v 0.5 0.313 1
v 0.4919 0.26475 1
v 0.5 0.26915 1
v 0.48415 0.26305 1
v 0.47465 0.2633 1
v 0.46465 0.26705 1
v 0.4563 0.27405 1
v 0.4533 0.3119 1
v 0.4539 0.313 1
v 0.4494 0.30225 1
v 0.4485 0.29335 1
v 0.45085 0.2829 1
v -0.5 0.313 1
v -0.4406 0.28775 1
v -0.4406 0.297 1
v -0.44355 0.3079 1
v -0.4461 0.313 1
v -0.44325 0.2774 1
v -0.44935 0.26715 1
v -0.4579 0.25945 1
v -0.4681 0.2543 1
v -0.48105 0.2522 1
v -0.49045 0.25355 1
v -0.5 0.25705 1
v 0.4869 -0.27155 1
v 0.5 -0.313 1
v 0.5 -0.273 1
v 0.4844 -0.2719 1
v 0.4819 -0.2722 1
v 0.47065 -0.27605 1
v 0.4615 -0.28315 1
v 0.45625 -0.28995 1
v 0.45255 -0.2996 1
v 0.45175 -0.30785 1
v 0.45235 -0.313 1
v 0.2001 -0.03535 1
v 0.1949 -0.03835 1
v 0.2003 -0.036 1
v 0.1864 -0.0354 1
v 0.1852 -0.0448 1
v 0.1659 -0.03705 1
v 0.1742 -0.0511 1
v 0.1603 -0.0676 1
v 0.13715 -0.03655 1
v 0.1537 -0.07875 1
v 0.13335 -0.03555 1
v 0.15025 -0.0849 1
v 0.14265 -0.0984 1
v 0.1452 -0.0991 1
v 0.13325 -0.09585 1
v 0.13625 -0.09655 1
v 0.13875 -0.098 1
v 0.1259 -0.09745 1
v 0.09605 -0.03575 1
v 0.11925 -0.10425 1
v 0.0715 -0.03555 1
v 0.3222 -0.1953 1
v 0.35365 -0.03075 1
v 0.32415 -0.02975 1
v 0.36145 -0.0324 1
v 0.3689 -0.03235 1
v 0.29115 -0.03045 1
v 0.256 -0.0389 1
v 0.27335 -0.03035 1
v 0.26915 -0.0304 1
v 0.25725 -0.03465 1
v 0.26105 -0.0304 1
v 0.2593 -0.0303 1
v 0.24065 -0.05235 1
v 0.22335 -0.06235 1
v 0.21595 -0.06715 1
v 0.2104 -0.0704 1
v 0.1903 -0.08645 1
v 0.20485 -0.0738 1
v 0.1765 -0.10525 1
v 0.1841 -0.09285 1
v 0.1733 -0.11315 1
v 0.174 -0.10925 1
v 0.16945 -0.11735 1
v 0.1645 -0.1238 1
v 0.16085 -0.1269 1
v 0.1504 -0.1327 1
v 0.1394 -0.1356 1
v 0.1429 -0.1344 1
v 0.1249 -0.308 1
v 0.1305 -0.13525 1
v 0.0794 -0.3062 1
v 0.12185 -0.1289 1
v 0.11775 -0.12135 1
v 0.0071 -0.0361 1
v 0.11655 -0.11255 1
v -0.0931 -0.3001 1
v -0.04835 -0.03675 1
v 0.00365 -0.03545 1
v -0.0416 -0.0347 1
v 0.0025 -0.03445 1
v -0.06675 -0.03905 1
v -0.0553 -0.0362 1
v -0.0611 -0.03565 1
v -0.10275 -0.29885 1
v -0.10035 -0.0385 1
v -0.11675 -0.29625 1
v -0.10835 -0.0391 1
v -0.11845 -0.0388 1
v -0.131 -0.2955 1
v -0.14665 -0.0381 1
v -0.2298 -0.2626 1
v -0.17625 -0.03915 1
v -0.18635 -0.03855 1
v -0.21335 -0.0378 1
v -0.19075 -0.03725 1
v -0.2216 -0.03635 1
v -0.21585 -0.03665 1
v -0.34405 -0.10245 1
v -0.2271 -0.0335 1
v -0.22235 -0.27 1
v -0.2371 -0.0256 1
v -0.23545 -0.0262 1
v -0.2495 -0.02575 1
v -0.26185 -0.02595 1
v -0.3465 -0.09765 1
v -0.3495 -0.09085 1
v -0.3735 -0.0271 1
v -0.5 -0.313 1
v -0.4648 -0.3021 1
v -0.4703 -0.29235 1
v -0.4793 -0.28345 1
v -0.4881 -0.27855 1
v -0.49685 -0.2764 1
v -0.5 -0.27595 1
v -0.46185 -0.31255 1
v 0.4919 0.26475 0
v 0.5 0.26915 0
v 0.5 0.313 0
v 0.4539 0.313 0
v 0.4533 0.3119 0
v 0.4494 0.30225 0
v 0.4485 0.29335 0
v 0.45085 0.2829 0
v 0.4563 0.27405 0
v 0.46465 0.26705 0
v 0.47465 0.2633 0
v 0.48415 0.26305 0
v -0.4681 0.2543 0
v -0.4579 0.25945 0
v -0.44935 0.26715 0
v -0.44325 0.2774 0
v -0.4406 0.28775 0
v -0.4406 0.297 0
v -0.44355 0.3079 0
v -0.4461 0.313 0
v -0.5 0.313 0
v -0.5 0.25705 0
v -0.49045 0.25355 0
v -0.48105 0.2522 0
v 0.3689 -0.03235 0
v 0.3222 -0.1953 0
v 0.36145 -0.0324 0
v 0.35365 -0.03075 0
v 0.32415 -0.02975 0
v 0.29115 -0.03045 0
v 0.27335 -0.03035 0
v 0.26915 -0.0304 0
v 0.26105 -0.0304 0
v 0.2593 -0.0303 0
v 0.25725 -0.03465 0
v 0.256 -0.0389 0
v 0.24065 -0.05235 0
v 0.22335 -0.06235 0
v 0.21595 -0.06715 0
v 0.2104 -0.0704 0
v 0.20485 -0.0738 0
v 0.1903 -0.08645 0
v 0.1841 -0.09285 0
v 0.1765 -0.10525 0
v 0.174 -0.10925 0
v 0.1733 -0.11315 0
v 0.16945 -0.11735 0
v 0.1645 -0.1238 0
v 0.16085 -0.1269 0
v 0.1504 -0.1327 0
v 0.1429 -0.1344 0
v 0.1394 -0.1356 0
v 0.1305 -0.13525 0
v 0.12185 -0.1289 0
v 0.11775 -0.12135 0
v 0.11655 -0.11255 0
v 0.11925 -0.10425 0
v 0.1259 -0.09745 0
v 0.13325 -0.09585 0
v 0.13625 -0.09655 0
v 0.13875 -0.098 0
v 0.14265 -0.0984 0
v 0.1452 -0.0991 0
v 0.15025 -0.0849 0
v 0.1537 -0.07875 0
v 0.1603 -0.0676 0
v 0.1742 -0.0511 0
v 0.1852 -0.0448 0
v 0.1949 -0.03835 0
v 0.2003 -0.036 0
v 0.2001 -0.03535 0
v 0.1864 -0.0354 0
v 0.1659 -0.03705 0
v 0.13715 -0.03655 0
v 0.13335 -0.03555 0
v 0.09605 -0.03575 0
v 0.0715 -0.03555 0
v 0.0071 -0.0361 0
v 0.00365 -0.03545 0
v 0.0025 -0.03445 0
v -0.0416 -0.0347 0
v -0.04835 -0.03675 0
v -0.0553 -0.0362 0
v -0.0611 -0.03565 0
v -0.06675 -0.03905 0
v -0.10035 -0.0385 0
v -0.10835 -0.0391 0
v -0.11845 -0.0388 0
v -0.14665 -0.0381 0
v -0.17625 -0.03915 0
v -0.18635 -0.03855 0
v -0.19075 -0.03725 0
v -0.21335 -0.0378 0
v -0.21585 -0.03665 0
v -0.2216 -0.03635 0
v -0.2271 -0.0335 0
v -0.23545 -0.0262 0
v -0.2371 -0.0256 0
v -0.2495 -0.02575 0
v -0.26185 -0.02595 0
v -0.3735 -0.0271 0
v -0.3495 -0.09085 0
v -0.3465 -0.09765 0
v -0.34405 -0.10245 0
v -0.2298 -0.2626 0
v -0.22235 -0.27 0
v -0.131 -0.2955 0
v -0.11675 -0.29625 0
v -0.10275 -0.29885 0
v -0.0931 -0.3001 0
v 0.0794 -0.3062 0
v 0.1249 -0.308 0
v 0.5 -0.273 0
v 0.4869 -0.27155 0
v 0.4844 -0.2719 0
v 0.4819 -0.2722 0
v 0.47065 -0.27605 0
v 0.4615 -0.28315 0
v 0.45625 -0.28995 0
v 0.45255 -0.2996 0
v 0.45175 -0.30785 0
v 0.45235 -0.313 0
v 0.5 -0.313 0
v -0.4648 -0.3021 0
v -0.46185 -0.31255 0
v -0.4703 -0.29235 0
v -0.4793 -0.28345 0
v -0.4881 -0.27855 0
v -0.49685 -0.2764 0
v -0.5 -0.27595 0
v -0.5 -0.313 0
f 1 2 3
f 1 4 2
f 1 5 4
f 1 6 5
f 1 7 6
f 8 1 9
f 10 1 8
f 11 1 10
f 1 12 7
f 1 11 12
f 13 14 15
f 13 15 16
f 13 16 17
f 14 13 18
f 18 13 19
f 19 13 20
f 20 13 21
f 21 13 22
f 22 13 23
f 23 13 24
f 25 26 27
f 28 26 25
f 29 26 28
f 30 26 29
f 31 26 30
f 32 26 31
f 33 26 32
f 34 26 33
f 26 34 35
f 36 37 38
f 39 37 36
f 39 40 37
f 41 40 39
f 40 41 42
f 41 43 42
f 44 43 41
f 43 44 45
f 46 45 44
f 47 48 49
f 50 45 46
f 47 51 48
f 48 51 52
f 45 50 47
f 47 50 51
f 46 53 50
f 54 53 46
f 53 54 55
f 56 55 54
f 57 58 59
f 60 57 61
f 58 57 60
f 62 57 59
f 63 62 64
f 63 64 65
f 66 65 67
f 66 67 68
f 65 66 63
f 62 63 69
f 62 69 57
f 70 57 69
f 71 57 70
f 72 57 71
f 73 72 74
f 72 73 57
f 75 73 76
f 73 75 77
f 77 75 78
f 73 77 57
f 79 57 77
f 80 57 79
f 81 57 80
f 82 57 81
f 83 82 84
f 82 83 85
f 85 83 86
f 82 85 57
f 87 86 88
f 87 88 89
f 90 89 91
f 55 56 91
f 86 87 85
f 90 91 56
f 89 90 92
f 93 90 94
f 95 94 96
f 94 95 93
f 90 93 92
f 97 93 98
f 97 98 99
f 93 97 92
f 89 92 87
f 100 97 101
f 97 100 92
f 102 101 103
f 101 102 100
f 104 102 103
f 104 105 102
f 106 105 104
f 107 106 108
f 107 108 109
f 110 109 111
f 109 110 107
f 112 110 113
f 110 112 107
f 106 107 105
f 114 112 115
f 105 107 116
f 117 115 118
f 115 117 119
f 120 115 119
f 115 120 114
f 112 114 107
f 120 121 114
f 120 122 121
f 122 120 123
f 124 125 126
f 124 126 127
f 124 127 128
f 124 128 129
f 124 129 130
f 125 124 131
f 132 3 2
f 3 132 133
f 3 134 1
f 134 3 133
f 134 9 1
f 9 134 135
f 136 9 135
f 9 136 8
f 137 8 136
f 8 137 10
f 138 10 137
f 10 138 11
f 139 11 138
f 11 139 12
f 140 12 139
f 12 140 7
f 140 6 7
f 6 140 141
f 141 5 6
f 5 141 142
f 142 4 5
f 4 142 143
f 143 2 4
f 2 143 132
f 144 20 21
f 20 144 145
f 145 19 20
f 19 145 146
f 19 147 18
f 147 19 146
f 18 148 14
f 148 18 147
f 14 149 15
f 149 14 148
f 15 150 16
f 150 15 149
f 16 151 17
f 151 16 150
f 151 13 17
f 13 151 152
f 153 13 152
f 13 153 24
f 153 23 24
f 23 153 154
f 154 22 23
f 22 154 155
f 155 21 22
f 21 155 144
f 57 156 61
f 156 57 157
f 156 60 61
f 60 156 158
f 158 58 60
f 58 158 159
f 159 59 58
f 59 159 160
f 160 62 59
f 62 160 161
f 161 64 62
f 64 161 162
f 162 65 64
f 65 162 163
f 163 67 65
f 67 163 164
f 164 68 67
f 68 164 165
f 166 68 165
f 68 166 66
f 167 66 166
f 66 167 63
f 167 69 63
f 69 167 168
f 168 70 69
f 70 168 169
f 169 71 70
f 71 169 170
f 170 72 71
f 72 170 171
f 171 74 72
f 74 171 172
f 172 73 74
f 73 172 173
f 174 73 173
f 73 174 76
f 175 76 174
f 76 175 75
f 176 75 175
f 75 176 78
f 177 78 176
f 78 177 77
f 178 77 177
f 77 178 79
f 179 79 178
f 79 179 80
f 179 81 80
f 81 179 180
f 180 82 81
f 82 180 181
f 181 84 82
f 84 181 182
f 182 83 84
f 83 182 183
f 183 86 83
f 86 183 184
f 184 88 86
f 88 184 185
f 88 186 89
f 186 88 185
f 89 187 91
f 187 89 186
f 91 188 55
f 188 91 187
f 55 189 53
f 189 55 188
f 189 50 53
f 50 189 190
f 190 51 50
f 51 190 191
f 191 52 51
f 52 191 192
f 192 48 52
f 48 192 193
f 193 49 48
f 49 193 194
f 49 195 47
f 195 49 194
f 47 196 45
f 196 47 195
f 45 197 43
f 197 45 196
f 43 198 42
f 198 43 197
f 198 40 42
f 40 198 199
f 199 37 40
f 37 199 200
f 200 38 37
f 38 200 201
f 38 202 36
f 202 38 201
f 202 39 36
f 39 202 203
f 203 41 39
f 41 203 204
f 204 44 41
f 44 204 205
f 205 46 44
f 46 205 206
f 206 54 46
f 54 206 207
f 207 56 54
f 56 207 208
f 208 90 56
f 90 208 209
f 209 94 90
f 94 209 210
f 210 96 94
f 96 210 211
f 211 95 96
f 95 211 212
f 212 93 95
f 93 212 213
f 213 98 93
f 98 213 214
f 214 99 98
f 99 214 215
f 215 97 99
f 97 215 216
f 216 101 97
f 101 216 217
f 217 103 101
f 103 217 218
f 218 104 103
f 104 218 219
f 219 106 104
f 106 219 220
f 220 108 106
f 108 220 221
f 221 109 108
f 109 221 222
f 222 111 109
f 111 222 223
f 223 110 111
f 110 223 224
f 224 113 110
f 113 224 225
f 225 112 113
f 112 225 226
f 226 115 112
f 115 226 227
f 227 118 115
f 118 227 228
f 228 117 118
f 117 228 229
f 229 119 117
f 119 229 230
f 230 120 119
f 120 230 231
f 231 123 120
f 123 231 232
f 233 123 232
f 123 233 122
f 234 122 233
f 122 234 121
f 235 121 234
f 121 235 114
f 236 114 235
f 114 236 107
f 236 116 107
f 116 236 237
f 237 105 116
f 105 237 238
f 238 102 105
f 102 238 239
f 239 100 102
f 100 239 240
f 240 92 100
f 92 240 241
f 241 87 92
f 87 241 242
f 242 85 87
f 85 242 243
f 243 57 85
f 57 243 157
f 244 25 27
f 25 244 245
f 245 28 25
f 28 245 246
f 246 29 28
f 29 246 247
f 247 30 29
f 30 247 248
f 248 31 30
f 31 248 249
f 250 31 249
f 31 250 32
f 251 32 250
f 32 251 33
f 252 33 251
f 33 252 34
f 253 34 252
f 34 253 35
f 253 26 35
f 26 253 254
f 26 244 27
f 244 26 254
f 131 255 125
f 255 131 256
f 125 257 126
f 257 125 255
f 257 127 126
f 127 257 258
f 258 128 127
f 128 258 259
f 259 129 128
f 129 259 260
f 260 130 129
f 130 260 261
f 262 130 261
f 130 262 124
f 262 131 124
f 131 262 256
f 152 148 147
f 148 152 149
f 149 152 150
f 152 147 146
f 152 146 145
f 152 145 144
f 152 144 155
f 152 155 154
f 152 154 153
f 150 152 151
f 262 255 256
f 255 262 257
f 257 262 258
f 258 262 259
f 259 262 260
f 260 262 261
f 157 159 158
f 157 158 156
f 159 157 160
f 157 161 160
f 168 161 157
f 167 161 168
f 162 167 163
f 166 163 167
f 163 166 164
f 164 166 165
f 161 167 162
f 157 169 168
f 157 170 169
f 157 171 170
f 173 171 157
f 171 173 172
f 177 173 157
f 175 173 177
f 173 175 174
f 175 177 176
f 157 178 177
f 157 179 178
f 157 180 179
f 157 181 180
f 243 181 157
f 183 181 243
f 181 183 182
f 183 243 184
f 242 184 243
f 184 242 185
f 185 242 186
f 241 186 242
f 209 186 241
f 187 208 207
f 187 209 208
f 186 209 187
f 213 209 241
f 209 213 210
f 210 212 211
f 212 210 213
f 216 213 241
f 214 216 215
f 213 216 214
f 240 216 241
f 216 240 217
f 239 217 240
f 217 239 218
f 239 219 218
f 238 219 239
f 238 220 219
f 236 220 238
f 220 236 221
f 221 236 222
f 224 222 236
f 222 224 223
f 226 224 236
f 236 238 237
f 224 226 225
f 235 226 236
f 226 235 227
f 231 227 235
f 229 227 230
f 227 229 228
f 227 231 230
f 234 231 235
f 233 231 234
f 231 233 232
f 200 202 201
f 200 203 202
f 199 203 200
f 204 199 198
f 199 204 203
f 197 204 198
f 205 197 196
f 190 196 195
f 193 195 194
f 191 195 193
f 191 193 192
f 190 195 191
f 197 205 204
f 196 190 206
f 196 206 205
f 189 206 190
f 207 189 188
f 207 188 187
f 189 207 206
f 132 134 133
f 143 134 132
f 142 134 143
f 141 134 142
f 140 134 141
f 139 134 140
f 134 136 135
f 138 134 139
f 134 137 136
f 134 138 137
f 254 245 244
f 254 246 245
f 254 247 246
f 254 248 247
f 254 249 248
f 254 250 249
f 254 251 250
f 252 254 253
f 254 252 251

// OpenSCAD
module fan7blue_1()
{
 /* Generated by trace2scad version 20150415
    http://aggregate.org/MAKE/TRACE2SCAD/
    Optimized model has 134/911 original points
 */
 color([0.5, 0.5, 0.5])
 assign(minx=0) /* polygon minx=0 */
 assign(miny=0) /* polygon miny=0 */
 assign(maxx=20000) /* polygon maxx=20000 */
 assign(maxy=12520) /* polygon maxy=12520 */
 assign(dx=maxx-minx)
 assign(dy=maxy-miny)
 assign(maxd=((dx>dy)?dx:dy))
 scale([1/maxd, 1/maxd, 1])
 translate([-minx-dx/2, -miny-dy/2, 0])
 linear_extrude(height=1, convexity=134)
 union() {
  union() {
   polygon([[0,11961],[0,11401],[191,11331],[379,11304],[638,11346],[842,11449],[1013,11603],[1135,11808],[1188,12015],[1188,12200],[1129,12418],[1078,12520],[0,12520]], convexity=5);
   polygon([[19072,12509],[19066,12498],[18988,12305],[18970,12127],[19017,11918],[19126,11741],[19293,11601],[19493,11526],[19683,11521],[19838,11555],[20000,11643],[20000,12520],[19078,12520]], convexity=6);
   polygon([[5010,5745],[4763,5741],[2530,5718],[3010,4443],[3070,4307],[3119,4211],[5404,1008],[5553,860],[7380,350],[7665,335],[7945,283],[8138,258],[11588,136],[12498,100],[16444,2354],[17378,5613],[17229,5612],[17073,5645],[16483,5665],[15823,5651],[15467,5653],[15383,5652],[15221,5652],[15186,5654],[15145,5567],[15120,5482],[14813,5213],[14467,5013],[14319,4917],[14208,4852],[14097,4784],[13806,4531],[13682,4403],[13530,4155],[13480,4075],[13466,3997],[13389,3913],[13290,3784],[13217,3722],[13008,3606],[12858,3572],[12788,3548],[12610,3555],[12437,3682],[12355,3833],[12331,4009],[12385,4175],[12518,4311],[12665,4343],[12725,4329],[12775,4300],[12853,4292],[12904,4278],[13005,4562],[13074,4685],[13206,4908],[13484,5238],[13704,5364],[13898,5493],[14006,5540],[14002,5553],[13728,5552],[13318,5519],[12743,5529],[12667,5549],[11921,5545],[11430,5549],[10142,5538],[10073,5551],[10050,5571],[9168,5566],[9033,5525],[8894,5536],[8778,5547],[8665,5479],[7993,5490],[7833,5478],[7631,5484],[7067,5498],[6475,5477],[6273,5489],[6185,5515],[5733,5504],[5683,5527],[5568,5533],[5458,5590],[5291,5736],[5258,5748]], convexity=33);
   polygon([[19688,822],[19638,816],[19413,739],[19230,597],[19125,461],[19051,268],[19035,103],[19047,0],[20000,0],[20000,800],[19738,829]], convexity=6);
   polygon([[0,371],[0,0],[763,9],[704,218],[594,413],[414,591],[238,689],[63,732],[0,741]], convexity=5);
  }
 }
}

module fan7blue()
{
 /* all layers combined, scaled to within a 1mm cube */
 scale([1, 1, 1/1])
 difference() {
  union() {
   scale([1,1,2]) translate([0,0,-0.5]) fan7blue_1();
  }
  translate([0,0,-2]) cube([2,2,4],center=true);
 }
}
fan7blue();
